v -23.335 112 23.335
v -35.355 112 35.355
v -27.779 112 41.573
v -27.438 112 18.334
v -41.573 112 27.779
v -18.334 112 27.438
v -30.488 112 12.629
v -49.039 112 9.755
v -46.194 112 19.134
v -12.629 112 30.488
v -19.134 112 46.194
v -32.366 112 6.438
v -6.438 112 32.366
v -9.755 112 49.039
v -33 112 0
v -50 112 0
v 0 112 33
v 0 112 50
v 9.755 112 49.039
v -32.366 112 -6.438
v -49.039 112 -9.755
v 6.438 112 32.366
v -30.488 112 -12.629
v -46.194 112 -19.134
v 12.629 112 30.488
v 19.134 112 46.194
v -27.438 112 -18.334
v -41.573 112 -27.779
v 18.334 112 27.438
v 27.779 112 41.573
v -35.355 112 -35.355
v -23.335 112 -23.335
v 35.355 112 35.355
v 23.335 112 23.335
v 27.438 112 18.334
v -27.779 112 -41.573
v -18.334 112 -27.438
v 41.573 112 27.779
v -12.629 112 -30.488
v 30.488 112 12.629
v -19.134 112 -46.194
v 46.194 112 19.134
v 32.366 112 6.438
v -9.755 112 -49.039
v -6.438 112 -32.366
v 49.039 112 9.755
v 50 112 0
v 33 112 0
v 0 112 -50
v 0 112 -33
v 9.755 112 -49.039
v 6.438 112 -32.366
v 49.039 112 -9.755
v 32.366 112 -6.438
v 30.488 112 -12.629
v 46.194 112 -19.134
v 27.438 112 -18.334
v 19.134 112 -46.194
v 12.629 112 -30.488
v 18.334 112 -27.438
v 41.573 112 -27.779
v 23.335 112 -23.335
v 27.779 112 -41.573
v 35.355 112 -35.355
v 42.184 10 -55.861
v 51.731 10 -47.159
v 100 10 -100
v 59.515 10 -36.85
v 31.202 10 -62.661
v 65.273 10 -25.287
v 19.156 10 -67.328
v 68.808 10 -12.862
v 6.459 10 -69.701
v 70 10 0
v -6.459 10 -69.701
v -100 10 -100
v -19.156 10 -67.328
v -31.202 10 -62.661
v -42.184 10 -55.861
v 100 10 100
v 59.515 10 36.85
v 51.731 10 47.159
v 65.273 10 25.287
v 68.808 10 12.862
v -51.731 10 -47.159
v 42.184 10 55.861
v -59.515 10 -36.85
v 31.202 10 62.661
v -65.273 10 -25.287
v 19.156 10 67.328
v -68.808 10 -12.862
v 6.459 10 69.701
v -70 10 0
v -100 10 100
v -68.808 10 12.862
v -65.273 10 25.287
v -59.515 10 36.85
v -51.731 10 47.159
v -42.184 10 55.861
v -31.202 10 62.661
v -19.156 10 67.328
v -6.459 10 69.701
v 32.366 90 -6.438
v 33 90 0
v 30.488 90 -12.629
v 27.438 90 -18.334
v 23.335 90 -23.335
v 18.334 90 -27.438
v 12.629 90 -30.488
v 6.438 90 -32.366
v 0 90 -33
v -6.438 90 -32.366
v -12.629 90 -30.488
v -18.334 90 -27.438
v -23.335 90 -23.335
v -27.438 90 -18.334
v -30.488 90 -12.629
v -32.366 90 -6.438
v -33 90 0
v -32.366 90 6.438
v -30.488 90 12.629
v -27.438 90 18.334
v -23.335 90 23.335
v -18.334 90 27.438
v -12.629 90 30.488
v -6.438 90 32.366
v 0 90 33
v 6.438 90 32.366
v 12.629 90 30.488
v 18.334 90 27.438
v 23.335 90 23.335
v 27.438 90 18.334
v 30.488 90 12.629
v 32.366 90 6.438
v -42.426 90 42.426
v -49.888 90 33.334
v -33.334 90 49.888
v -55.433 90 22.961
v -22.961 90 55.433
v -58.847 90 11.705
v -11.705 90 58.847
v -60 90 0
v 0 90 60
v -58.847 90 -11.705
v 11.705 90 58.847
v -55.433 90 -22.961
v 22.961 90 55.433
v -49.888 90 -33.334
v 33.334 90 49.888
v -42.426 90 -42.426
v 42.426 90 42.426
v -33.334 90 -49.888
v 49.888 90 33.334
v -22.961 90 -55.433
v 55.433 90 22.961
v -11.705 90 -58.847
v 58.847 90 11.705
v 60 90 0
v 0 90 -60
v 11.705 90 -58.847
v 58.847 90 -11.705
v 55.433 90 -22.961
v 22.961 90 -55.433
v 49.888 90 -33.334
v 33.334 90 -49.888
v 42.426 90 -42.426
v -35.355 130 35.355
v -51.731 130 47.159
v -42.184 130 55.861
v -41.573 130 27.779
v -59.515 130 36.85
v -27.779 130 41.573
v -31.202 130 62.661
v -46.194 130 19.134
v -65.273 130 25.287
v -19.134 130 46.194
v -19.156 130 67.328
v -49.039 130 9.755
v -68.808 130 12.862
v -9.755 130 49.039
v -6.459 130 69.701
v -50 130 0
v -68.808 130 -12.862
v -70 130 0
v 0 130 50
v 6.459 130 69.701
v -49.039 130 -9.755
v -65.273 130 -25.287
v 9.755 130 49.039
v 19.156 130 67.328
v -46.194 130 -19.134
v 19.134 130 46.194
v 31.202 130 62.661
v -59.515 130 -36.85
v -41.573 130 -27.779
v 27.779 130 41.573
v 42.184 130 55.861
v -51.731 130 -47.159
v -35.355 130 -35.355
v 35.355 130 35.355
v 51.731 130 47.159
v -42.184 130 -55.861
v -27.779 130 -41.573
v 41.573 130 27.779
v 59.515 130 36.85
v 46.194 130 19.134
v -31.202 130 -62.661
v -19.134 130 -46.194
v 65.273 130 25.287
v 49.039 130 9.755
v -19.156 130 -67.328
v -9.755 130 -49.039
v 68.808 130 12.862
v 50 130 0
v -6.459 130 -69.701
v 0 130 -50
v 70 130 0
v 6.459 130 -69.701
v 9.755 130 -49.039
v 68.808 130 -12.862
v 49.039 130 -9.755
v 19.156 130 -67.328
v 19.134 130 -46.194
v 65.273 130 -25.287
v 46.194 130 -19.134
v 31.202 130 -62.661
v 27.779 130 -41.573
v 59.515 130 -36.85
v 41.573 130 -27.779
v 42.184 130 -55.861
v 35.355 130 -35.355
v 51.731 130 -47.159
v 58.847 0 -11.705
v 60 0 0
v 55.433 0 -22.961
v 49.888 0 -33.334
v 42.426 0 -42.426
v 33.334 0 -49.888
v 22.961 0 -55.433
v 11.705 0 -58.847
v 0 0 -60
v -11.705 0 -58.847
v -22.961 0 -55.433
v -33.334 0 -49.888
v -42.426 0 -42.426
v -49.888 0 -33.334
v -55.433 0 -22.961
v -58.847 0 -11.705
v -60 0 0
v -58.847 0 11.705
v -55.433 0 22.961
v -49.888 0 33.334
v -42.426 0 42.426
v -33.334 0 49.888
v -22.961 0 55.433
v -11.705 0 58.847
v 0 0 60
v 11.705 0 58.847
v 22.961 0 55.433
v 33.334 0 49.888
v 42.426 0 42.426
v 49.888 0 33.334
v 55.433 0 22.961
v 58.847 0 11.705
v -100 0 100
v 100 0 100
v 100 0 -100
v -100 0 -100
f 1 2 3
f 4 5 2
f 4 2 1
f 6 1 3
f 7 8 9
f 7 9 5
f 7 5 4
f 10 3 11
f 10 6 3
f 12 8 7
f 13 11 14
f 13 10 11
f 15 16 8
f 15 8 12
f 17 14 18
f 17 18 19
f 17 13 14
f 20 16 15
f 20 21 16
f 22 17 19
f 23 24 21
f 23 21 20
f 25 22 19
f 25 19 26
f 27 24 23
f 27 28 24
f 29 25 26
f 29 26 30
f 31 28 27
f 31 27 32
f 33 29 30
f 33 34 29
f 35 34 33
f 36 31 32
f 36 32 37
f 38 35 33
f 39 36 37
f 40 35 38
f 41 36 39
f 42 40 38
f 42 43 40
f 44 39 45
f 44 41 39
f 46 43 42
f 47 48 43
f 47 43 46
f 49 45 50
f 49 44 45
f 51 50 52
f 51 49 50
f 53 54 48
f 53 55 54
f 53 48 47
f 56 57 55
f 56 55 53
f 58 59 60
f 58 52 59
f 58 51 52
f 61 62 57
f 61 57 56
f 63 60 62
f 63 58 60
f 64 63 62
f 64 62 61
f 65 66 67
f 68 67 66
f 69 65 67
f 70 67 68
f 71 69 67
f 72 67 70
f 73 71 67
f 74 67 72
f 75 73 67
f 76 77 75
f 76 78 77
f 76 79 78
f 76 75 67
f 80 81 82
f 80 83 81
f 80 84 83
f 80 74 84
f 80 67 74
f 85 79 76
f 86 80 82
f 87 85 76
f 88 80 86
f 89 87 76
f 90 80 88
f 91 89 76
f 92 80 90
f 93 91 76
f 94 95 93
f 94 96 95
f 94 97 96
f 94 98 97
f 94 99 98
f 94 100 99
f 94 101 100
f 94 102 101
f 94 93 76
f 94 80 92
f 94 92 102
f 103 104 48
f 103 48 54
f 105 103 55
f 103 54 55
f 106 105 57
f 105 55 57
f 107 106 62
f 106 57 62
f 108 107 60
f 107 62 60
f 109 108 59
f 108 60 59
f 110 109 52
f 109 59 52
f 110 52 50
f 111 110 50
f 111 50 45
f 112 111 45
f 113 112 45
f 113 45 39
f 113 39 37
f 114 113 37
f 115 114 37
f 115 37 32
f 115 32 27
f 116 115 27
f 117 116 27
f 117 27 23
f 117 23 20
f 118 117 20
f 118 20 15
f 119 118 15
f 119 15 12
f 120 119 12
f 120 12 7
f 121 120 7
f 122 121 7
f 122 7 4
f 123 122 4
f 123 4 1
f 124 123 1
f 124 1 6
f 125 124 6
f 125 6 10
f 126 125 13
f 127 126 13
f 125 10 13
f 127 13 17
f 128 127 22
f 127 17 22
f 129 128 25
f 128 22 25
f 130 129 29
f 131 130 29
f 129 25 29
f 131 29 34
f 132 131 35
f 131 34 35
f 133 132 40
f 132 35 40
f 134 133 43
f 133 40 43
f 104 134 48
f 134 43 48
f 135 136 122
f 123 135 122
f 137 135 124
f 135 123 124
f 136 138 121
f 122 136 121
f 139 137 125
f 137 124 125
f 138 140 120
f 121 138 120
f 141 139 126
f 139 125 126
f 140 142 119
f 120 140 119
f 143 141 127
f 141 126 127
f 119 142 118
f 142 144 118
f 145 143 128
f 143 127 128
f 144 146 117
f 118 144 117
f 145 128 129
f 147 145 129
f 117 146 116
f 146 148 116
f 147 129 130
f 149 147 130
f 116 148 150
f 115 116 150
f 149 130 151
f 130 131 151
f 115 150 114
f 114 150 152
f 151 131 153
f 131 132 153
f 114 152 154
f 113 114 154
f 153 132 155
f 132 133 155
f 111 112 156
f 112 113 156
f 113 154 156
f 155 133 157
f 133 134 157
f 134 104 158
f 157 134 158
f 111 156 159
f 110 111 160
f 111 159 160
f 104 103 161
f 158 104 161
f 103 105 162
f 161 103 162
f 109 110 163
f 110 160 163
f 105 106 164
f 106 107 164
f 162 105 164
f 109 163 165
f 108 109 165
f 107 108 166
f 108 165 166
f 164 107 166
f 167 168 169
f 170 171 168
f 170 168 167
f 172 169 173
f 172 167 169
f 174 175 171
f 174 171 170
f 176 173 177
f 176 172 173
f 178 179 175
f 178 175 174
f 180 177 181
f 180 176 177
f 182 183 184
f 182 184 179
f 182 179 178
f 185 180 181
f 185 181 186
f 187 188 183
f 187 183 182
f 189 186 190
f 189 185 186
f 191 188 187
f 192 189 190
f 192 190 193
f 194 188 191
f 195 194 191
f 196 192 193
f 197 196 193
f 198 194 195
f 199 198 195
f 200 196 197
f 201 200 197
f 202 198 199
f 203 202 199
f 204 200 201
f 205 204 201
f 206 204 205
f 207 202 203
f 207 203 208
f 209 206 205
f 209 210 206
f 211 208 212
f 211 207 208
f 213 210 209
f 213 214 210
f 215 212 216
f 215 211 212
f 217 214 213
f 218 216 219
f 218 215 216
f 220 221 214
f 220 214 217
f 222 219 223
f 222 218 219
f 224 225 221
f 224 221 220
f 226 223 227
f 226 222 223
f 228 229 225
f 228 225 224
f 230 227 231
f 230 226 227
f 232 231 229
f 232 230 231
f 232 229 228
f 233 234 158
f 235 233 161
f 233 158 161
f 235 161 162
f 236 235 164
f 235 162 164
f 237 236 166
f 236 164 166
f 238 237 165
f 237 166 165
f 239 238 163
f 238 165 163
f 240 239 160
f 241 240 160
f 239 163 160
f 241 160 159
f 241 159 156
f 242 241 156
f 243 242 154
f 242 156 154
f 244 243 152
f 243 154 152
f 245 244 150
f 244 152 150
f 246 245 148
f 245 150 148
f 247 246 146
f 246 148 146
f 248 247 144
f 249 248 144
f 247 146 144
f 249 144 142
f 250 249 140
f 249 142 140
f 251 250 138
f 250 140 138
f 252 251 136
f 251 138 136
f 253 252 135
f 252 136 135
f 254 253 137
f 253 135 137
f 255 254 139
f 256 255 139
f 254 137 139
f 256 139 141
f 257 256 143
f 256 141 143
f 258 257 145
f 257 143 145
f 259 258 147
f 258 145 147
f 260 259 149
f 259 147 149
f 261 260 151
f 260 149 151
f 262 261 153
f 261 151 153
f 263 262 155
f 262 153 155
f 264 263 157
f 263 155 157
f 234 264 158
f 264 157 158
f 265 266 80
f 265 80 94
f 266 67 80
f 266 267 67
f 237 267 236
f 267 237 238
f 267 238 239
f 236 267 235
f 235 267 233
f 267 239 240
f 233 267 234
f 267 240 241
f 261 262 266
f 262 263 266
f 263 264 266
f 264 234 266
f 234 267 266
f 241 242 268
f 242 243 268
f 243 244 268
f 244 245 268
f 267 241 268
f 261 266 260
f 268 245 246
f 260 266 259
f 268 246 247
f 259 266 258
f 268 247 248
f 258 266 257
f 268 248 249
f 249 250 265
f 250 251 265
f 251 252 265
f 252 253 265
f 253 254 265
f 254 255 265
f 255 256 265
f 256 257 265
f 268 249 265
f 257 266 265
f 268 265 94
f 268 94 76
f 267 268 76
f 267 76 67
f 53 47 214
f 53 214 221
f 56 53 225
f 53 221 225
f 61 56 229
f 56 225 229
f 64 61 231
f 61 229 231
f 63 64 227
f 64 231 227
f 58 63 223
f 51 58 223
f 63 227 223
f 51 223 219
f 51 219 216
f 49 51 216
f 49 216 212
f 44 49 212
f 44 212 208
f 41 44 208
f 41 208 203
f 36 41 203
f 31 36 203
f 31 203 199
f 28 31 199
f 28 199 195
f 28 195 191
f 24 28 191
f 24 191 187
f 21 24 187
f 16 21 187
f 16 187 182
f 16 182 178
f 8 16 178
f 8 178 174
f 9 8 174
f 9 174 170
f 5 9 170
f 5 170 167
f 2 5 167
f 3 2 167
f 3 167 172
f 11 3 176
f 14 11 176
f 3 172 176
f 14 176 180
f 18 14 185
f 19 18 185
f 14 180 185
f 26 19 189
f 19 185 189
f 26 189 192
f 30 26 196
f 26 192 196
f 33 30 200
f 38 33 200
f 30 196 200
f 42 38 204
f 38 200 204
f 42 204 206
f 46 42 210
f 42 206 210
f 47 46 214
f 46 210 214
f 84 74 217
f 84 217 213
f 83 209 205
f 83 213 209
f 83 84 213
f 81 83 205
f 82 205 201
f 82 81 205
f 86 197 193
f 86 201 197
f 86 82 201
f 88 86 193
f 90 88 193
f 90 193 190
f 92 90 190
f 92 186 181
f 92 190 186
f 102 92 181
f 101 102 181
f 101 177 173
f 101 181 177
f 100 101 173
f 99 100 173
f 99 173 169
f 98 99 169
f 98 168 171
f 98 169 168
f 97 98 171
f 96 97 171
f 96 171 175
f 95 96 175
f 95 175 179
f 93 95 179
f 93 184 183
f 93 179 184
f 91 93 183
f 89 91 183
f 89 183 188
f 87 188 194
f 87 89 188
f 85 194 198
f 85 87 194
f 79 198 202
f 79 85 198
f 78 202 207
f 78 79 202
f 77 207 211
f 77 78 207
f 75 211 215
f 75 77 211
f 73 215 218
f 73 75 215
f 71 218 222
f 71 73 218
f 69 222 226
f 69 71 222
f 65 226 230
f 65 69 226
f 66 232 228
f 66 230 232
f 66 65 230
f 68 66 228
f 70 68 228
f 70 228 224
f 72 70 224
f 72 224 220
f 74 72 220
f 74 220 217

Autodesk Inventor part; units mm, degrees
ref_plane "YZ Plane" through (0, 0, 0) normal (1, 0, 0) x (0, 1, 0)
ref_plane "XZ Plane" through (0, 0, 0) normal (0, 1, 0) x (-1, 0, 0)
ref_plane "XY Plane" through (0, 0, 0) normal (0, 0, 1) x (1, 0, 0)
sketch "Sketch1" plane through (0, 0, 0) normal (0, 1, 0) x (-1, 0, 0)
  line L0 (-100, 100) -> (100, 100)
  line L1 (100, 100) -> (100, -100)
  line L2 (100, -100) -> (-100, -100)
  line L3 (-100, -100) -> (-100, 100)
  line L4 (-100, 100) -> (100, -100) construction
  line L5 (100, 100) -> (-100, -100) construction
  point P0 (0, 0)
  dimension "d0" = 200
  dimension "d1" = 200
extrude "podstawa na mocowanie" add sketch "Sketch1" along normal blind 10
sketch "Sketch2" plane through (0, 10, 0) normal (0, 1, 0) x (1, 0, 0)
  circle A0 centre (0, 0) radius 70
  circle A1 centre (0, 0) radius 60
  dimension "d4" = 140
  dimension "d5" = 120
extrude "trzon c0" add sketch "Sketch2" along normal blind 120
sketch "Sketch5" plane through (0, 10, 0) normal (0, 1, 0) x (1, 0, 0)
  circle A0 centre (0, 0) radius 60 projected
  circle A1 centre (0, 0) radius 60
  dimension "d19" = 120
extrude "wneka na silnik c0" cut sketch "Sketch5" against normal blind 10
sketch "Sketch6" plane through (0, 130, 0) normal (0, 1, 0) x (1, 0, 0)
  circle A0 centre (0, 0) radius 60
  dimension "d20" = 120
extrude "powierzchnia nosna dla c1" add sketch "Sketch6" against normal blind 40
sketch "Sketch8" plane through (0, 130, 0) normal (0, 1, 0) x (1, 0, 0)
  circle A0 centre (0, 0) radius 50
  dimension "d13" = 100
extrude "wneka na łożysko R0" cut sketch "Sketch8" against normal blind 18
sketch "Sketch9" plane through (0, 112, 0) normal (0, 1, 0) x (1, 0, 0)
  circle A0 centre (0, 0) radius 33
  dimension "d16" = 66
extrude "dziura na wal c1" cut sketch "Sketch9" against normal blind 22
properties part number "C0" material "Aluminum 6061"
